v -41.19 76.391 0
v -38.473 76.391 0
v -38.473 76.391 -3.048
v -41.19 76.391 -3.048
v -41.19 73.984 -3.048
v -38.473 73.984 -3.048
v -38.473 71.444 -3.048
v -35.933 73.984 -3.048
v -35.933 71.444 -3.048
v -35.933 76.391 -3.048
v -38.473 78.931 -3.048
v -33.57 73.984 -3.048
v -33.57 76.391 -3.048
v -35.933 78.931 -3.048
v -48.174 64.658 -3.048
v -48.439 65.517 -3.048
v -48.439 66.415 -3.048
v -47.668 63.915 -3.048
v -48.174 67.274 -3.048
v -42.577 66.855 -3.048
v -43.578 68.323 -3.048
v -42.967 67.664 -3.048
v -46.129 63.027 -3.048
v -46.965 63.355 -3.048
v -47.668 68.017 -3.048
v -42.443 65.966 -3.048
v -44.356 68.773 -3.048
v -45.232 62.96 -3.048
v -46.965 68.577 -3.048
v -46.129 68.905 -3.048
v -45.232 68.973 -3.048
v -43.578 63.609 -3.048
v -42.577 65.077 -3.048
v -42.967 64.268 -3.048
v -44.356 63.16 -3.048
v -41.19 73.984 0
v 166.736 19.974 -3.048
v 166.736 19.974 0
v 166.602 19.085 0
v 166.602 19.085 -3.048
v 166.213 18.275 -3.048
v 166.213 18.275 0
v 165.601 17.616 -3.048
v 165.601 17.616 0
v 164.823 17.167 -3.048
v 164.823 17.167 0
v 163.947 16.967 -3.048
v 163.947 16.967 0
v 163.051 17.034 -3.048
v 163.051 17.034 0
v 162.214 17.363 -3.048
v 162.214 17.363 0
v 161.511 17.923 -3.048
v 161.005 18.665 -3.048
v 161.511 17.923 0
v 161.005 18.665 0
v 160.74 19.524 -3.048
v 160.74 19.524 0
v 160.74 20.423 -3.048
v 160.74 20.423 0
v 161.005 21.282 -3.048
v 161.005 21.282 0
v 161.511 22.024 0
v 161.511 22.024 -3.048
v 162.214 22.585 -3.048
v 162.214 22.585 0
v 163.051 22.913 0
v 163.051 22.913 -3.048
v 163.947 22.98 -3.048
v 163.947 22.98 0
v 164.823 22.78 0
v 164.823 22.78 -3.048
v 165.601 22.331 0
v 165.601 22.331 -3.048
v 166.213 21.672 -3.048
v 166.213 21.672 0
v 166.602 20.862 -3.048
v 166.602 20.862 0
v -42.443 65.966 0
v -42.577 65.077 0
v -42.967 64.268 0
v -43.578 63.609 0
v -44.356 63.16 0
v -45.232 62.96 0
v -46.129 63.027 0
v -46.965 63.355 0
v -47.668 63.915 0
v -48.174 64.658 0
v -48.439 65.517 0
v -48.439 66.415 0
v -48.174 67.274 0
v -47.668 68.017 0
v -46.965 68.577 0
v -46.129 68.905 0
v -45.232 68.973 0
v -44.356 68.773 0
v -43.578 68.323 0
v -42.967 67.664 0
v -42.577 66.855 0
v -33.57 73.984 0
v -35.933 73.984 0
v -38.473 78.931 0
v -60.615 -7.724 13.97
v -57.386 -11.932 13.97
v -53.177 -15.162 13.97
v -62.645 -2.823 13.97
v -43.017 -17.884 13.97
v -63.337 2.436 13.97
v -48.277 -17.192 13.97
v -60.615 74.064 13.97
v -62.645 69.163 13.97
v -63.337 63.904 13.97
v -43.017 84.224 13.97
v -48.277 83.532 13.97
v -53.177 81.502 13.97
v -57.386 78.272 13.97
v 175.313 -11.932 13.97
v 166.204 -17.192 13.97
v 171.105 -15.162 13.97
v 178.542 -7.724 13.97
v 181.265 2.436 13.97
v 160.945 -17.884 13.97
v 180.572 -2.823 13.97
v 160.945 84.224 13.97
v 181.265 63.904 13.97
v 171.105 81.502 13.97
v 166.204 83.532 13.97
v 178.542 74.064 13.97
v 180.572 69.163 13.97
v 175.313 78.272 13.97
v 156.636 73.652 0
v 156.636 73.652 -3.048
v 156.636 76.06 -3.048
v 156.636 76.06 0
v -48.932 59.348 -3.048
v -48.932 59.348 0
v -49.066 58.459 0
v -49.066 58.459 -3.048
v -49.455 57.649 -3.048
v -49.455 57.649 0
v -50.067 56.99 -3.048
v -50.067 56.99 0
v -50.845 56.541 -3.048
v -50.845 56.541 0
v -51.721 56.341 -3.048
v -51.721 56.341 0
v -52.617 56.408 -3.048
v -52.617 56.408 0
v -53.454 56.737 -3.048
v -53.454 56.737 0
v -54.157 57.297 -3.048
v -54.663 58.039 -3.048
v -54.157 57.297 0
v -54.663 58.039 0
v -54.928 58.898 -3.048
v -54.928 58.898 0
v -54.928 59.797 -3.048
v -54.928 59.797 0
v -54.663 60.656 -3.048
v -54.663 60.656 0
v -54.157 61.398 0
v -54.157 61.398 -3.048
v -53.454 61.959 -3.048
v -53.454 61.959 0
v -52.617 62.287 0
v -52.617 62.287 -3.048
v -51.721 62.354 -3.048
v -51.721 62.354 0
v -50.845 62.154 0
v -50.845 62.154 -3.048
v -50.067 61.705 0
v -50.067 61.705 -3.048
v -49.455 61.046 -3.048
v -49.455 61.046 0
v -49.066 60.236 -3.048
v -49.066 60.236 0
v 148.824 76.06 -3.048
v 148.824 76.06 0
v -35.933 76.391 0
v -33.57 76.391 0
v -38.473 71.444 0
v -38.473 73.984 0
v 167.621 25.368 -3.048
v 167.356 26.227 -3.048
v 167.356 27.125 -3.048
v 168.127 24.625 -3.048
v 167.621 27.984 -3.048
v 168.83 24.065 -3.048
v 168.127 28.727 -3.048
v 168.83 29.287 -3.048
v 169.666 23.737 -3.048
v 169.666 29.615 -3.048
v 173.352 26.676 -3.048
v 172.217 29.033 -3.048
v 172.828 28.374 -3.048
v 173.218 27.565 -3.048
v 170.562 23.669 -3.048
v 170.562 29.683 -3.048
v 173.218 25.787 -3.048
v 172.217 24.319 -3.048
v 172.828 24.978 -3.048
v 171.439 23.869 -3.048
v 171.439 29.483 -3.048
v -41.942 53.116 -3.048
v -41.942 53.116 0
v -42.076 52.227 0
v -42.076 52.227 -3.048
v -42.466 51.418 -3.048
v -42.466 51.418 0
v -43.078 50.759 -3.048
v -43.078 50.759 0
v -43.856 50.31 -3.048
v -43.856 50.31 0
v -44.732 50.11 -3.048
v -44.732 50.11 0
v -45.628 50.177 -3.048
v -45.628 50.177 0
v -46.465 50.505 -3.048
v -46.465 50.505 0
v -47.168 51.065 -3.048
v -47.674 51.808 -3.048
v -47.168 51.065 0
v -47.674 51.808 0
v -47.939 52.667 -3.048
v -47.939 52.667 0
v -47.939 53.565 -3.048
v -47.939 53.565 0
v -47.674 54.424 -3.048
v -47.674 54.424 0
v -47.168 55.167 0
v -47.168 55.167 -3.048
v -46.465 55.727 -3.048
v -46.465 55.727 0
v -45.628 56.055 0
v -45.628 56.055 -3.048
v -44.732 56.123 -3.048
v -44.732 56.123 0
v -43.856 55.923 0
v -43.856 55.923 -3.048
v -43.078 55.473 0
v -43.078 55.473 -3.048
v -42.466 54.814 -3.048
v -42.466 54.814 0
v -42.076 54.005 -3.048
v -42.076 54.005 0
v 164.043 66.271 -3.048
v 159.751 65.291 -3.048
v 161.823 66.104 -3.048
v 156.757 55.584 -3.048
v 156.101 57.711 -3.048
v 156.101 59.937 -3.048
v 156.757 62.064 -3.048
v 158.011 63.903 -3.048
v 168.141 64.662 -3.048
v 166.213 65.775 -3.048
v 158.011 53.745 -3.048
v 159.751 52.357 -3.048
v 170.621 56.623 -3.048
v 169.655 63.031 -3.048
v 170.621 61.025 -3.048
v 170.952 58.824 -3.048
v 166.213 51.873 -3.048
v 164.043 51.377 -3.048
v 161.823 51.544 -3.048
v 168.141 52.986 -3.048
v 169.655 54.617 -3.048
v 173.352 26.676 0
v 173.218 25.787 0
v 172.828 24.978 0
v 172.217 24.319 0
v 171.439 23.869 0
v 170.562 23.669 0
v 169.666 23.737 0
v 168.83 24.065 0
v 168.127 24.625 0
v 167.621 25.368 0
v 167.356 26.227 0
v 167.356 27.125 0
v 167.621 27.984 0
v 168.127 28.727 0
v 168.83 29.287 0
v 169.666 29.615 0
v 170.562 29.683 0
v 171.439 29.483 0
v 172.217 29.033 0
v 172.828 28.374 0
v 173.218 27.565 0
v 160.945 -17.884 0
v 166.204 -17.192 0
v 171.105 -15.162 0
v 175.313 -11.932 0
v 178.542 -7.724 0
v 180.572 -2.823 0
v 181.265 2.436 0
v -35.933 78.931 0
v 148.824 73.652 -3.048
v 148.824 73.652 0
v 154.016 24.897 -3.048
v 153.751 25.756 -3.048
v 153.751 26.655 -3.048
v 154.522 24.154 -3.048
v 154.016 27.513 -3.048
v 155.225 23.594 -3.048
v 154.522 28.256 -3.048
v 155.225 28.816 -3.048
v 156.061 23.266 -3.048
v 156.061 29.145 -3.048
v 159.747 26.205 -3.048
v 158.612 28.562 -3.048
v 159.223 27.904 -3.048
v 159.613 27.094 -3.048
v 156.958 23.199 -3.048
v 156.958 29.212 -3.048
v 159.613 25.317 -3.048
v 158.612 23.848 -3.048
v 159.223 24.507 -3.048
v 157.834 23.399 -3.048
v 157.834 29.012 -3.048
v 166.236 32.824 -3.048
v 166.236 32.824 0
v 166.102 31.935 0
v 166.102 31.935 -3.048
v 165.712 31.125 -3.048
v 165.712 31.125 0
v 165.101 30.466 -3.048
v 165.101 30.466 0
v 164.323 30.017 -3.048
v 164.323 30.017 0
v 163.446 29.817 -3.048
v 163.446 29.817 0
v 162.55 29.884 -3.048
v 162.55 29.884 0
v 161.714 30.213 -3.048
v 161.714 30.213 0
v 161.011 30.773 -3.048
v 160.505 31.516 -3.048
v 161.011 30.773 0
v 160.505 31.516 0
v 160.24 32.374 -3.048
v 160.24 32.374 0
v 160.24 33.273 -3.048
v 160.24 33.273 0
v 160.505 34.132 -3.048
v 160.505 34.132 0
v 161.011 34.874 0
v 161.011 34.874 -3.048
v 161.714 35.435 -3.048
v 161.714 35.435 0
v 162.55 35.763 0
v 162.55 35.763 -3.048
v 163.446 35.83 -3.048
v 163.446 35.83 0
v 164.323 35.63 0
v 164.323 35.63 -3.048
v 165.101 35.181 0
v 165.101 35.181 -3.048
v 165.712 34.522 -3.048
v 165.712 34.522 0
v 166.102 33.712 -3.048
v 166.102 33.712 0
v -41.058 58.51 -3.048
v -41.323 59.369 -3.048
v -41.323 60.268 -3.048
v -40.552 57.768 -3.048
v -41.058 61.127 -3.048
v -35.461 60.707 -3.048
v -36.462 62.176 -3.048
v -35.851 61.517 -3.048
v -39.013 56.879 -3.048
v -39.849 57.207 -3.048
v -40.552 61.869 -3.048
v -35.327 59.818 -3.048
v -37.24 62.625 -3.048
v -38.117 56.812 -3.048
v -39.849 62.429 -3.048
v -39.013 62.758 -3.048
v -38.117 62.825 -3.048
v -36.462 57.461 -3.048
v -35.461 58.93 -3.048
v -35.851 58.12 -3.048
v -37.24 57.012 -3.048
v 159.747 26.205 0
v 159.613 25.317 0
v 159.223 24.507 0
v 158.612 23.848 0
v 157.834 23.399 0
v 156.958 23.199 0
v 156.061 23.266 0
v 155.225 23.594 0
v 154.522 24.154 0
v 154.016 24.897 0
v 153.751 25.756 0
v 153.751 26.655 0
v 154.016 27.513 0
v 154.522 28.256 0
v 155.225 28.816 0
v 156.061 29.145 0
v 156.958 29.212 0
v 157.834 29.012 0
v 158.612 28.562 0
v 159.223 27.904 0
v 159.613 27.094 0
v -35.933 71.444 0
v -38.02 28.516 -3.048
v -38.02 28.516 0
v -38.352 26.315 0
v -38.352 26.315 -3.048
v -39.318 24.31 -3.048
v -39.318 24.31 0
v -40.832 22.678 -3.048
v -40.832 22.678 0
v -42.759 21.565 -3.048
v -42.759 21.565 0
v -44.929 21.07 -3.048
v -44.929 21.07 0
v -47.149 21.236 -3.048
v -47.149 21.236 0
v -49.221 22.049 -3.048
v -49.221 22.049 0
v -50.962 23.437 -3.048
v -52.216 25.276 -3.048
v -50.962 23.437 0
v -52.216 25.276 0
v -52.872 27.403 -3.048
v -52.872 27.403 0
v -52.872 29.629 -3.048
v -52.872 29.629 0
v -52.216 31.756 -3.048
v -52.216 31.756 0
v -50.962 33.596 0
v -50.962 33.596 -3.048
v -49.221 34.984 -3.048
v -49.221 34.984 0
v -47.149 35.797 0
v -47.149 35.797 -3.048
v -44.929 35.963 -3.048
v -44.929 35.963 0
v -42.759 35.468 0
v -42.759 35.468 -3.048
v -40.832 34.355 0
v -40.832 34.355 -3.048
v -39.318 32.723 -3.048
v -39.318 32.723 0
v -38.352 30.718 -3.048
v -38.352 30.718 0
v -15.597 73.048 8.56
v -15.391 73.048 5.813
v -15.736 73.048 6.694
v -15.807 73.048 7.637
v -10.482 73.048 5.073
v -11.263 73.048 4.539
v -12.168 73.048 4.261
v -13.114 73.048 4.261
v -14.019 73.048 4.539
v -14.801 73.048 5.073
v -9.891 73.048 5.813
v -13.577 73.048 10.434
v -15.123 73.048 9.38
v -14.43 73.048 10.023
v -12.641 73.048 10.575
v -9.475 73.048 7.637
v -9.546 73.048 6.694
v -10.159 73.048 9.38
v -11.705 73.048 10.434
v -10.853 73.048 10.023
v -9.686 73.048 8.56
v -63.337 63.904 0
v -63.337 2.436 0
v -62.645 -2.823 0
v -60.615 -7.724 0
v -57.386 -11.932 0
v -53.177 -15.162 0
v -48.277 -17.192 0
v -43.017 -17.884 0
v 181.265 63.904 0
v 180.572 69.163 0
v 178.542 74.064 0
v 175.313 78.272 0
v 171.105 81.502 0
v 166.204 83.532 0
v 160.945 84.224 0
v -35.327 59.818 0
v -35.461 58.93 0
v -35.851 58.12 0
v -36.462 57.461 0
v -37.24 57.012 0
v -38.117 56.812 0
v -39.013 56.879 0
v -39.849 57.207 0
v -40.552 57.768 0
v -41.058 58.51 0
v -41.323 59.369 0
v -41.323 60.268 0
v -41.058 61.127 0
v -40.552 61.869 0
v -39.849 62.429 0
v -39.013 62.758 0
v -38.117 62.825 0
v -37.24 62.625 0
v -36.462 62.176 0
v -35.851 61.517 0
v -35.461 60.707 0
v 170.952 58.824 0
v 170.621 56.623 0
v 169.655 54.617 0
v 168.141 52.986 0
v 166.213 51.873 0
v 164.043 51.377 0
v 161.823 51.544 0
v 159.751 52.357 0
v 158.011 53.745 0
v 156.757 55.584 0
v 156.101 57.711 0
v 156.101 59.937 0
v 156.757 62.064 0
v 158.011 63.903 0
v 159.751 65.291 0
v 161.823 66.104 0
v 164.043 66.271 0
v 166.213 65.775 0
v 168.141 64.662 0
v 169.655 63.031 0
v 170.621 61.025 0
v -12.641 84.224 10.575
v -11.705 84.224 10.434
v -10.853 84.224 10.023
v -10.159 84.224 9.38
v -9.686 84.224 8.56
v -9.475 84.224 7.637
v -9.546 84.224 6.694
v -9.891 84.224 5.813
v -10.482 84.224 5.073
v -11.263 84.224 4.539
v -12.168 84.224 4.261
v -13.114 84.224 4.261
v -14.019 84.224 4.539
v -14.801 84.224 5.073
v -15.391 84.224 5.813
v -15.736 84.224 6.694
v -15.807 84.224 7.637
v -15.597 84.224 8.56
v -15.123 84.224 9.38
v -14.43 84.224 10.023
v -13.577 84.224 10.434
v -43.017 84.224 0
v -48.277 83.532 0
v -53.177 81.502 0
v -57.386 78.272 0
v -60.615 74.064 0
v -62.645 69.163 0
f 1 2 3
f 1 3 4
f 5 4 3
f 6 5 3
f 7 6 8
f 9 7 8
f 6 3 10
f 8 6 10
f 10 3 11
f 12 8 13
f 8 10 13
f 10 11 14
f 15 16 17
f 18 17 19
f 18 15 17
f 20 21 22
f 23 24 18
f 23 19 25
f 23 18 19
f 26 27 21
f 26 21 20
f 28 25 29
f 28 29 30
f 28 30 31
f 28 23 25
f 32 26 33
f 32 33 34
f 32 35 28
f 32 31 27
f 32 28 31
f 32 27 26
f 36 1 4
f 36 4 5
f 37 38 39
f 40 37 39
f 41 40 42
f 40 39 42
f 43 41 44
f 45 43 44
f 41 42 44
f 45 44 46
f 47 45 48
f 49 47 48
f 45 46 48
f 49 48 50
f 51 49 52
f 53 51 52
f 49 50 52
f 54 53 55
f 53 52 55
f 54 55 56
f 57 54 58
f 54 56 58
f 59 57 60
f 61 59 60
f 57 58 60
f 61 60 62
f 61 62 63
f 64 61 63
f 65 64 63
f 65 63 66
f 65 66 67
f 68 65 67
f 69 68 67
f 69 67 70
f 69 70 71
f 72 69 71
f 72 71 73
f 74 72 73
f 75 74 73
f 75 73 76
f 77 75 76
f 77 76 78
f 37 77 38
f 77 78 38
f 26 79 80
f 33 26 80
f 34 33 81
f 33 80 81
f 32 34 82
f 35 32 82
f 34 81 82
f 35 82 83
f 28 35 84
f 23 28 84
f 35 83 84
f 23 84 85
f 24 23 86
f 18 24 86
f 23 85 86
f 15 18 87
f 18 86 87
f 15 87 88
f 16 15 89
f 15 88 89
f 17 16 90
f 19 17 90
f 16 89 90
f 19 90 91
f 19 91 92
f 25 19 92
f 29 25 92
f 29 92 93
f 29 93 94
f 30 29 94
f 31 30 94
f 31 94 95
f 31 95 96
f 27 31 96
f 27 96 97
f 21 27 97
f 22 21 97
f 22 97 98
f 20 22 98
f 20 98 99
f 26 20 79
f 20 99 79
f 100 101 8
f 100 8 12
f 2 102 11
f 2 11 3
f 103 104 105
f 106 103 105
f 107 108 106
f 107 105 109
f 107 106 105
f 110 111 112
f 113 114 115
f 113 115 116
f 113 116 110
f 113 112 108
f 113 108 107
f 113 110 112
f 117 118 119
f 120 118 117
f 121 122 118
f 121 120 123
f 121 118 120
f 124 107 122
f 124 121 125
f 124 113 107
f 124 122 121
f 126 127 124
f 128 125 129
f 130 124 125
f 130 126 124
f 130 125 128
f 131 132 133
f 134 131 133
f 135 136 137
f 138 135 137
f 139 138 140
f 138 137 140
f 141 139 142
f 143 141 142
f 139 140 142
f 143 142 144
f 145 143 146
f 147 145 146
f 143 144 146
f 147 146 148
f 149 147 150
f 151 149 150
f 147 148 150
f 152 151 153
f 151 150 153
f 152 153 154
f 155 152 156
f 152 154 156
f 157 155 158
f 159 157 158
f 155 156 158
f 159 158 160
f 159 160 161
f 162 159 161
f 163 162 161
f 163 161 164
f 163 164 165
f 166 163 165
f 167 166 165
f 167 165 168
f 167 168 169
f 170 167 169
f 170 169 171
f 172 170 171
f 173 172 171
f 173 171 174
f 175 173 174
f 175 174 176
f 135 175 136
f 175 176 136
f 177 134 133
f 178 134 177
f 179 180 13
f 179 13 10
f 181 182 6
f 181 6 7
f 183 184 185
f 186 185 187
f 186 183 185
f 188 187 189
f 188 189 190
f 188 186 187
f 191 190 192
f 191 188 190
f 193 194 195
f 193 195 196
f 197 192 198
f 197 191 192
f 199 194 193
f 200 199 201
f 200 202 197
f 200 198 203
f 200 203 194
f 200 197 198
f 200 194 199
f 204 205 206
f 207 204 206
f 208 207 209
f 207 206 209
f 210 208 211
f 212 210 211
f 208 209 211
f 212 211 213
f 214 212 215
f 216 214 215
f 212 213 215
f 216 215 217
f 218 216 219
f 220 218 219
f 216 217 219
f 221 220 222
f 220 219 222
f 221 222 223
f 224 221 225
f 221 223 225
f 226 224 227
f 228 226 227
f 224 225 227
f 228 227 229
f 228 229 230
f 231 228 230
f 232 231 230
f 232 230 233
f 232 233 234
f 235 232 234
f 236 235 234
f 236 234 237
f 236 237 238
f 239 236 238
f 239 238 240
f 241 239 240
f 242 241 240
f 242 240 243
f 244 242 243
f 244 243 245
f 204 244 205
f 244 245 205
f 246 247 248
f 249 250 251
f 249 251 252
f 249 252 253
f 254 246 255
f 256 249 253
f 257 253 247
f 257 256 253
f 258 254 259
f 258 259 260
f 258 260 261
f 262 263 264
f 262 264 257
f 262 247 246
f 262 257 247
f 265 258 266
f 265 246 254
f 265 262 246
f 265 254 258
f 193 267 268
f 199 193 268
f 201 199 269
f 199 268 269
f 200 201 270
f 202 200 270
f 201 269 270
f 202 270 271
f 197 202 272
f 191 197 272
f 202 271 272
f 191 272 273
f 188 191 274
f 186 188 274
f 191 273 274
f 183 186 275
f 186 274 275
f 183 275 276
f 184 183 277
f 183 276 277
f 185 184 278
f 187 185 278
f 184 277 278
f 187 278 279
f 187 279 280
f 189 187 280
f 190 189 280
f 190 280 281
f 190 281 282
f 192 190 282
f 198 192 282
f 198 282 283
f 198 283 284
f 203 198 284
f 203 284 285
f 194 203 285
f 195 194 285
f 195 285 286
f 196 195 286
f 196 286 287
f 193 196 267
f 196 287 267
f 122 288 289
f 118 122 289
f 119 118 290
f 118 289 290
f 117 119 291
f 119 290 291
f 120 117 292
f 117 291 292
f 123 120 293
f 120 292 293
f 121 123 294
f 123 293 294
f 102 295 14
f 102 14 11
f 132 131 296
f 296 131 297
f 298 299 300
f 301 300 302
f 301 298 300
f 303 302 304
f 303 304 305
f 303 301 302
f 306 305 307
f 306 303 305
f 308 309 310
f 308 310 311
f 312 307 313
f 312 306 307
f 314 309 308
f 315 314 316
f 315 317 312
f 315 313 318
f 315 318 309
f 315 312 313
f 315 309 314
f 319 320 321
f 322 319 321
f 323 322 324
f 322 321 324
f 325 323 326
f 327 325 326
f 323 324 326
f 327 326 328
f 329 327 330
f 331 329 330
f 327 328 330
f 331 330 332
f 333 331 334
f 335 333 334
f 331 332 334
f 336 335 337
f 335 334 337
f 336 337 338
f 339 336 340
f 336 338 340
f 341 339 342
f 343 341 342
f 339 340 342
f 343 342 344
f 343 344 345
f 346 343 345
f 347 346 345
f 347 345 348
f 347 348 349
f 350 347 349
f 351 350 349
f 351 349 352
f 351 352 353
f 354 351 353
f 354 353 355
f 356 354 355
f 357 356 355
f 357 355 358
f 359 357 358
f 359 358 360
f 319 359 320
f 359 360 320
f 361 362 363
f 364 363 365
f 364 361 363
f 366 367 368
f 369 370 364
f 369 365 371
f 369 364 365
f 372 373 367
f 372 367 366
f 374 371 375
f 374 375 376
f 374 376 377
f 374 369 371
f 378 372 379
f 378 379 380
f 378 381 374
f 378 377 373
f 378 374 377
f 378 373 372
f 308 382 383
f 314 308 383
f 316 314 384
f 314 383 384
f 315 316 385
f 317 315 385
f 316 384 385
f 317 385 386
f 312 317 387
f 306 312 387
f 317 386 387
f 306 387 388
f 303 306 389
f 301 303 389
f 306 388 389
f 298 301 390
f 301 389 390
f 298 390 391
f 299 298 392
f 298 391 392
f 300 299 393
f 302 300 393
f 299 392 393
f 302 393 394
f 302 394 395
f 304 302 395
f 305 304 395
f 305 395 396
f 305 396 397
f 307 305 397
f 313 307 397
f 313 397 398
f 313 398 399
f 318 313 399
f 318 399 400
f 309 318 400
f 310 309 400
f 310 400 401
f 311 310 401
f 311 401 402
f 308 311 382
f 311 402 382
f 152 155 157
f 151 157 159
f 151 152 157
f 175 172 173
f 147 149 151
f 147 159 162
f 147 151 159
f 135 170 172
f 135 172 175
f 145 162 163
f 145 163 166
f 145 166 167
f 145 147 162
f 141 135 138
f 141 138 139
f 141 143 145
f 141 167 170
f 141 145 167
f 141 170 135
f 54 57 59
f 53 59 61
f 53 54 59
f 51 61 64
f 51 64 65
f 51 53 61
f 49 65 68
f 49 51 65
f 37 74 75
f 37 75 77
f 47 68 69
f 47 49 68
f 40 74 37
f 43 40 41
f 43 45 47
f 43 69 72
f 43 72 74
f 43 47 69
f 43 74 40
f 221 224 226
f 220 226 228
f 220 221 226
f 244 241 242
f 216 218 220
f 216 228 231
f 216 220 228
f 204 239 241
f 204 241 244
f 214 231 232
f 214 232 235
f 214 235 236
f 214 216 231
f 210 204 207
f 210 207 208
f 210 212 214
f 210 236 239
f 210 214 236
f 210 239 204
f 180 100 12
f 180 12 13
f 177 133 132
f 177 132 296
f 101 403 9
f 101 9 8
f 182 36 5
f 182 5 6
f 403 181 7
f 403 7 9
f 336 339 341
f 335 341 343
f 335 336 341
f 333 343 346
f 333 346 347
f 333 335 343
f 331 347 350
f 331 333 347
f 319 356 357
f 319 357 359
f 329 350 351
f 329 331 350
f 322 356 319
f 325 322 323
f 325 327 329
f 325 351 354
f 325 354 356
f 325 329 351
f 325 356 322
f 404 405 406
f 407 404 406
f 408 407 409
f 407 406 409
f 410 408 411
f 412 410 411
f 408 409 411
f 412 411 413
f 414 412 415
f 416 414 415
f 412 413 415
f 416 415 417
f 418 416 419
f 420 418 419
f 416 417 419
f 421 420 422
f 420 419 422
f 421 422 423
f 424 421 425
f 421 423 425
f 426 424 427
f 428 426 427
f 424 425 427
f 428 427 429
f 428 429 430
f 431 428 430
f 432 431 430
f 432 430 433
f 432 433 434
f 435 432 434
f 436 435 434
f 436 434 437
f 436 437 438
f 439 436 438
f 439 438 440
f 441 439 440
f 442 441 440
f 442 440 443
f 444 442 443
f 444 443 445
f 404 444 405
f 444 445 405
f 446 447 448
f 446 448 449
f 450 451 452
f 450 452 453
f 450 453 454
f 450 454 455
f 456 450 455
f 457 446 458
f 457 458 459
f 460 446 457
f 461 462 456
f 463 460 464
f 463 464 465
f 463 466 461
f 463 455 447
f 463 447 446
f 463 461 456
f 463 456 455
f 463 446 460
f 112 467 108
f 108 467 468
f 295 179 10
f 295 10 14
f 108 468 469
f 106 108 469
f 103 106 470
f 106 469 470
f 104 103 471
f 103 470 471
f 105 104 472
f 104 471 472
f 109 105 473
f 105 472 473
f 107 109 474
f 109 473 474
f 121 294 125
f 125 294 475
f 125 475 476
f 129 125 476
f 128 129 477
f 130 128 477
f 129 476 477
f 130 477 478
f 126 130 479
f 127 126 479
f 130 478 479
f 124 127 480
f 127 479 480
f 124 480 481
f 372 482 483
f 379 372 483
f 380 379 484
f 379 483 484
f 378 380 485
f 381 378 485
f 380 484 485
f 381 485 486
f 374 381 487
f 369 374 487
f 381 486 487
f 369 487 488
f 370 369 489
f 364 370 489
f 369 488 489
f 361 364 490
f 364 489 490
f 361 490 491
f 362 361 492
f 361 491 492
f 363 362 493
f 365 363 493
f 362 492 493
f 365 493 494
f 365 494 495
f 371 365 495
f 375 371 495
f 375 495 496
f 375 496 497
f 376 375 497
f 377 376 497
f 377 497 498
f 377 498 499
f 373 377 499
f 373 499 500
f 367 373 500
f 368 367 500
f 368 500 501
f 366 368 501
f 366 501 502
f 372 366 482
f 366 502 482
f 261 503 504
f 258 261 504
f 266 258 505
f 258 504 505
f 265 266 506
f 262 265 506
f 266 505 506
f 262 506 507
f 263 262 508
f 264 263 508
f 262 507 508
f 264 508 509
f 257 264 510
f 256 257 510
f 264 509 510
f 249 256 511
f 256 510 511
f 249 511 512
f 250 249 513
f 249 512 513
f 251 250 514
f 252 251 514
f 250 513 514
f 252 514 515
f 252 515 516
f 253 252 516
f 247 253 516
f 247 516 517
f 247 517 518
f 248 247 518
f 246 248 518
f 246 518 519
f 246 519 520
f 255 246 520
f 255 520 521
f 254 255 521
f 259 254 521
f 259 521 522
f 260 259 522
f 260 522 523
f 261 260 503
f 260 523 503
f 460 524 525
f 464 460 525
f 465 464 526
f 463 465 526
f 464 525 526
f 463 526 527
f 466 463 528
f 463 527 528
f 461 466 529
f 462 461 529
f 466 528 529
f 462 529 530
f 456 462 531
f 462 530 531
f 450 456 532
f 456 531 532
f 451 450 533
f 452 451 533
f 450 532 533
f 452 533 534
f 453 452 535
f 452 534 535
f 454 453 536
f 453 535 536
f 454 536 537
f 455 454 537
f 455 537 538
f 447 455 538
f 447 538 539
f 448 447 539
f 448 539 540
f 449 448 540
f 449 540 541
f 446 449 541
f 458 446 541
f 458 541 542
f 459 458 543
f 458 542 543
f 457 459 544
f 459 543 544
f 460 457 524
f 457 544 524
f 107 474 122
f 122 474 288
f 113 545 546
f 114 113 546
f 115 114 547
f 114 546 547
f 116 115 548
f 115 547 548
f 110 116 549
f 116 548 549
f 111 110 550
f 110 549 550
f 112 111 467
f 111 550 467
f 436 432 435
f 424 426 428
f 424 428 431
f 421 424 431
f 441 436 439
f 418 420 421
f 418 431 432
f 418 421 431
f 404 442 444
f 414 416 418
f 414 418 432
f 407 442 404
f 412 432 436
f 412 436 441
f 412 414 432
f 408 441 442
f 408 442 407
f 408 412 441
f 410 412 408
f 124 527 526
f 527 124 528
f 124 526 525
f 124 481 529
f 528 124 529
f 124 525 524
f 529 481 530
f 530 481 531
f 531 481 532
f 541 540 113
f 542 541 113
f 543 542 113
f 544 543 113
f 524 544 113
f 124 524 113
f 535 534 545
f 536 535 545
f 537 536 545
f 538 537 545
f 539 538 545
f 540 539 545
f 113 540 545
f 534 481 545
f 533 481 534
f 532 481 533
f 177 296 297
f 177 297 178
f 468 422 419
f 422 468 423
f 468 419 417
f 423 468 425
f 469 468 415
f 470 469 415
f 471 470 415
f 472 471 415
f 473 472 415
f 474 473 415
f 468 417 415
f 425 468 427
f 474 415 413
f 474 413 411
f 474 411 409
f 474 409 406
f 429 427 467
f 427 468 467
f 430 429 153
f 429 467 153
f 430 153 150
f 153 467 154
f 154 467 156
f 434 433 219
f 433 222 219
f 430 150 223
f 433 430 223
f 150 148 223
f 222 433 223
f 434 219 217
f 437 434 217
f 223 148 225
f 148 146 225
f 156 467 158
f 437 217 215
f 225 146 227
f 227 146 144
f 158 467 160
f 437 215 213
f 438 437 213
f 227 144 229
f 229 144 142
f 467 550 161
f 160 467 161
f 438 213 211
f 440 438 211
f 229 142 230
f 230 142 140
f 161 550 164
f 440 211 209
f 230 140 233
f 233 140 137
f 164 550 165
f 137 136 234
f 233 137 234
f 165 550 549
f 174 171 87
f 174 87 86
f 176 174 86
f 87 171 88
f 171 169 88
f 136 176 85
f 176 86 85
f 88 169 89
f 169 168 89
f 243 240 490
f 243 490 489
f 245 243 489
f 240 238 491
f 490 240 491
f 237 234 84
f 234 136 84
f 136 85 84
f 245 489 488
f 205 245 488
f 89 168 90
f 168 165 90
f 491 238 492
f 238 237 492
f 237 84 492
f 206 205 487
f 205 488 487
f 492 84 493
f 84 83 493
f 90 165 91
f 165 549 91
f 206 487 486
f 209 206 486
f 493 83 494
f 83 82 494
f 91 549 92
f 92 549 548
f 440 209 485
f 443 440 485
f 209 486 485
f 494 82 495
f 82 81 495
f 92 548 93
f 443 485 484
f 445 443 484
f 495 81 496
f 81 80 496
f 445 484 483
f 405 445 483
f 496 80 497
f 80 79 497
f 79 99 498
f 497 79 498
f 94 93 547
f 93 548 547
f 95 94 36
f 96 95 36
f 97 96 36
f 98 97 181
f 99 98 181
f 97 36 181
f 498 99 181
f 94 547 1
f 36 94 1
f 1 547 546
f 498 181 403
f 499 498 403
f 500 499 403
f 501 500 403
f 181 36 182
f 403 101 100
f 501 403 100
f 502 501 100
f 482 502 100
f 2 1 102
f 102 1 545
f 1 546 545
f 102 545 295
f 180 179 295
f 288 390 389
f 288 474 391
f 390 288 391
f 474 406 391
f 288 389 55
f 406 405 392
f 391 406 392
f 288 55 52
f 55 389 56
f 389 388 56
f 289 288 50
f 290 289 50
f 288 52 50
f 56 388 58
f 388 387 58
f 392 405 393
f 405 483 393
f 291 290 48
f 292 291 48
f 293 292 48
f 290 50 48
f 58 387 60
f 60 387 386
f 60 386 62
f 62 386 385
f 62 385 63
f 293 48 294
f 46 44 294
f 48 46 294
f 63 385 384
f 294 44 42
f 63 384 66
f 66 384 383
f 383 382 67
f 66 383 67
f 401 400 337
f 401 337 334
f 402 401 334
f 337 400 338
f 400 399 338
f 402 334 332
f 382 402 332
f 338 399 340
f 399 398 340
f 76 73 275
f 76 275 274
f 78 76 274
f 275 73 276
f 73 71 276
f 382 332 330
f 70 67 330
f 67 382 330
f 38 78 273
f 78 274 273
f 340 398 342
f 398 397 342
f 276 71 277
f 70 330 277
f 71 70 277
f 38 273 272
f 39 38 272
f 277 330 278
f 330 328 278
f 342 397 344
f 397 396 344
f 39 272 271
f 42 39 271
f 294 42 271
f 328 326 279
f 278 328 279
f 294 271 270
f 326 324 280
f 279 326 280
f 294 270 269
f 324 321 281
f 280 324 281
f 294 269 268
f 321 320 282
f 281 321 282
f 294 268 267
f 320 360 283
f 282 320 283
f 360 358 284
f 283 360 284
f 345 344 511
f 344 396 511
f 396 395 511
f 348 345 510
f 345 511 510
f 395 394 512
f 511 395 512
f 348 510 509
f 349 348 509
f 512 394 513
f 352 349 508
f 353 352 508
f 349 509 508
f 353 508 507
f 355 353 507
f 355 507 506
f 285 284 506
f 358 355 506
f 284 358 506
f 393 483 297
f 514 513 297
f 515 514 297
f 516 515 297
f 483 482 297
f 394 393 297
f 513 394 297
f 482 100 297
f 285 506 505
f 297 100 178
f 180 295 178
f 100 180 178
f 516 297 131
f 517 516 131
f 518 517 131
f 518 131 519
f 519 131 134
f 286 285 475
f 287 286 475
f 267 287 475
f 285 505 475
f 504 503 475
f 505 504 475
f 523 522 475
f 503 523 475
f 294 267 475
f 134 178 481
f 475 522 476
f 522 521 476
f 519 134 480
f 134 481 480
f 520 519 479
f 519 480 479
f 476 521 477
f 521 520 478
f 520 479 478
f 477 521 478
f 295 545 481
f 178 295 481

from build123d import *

# Parameters (mm, degrees)
SKETCH1_W           = 172.974
SKETCH1_H           = 102.108
BOSS_EXTRUDE1_DEPTH = 13.97
SKETCH2_R           = 7.4676
SKETCH2_R_2         = 3.014975044
SKETCH2_W           = 7.81218406
SKETCH2_H           = 2.407827673
BOSS_EXTRUDE3_DEPTH = 3.048
SKETCH3_R           = 7.4676
SKETCH3_R_2         = 3.014975044
BOSS_EXTRUDE5_DEPTH = 3.048
SKETCH4_R           = 3.175
CUT_EXTRUDE1_DEPTH  = 11.176


with BuildPart() as part:
    # Sketch1 → Boss-Extrude1 (new body)
    with BuildSketch(Plane.XY):
        with Locations((58.9637029, 33.169946412)):
            Rectangle(SKETCH1_W, SKETCH1_H)
        with BuildLine():
            Line((-27.5232971, 84.223946412), (-43.0172971, 84.223946412))
            ThreePointArc((-43.0172971, 84.223946412), (-57.385706894, 78.272356205), (-63.3372971, 63.903946412))
            Line((-63.3372971, 63.903946412), (-63.3372971, 2.435946412))
            ThreePointArc((-63.3372971, 2.435946412), (-57.385706894, -11.932463382), (-43.0172971, -17.884053588))
            Line((-43.0172971, -17.884053588), (-27.5232971, -17.884053588))
            Line((-27.5232971, -17.884053588), (-27.5232971, 84.223946412))
        make_face()
        with BuildLine():
            Line((160.9447029, 84.223946412), (145.4507029, 84.223946412))
            Line((145.4507029, 84.223946412), (145.4507029, -17.884053588))
            Line((145.4507029, -17.884053588), (160.9447029, -17.884053588))
            ThreePointArc((160.9447029, -17.884053588), (175.313112694, -11.932463382), (181.2647029, 2.435946412))
            Line((181.2647029, 2.435946412), (181.2647029, 63.903946412))
            ThreePointArc((181.2647029, 63.903946412), (175.313112694, 78.272356205), (160.9447029, 84.223946412))
        make_face()
    extrude(amount=BOSS_EXTRUDE1_DEPTH)

    # Sketch2 → Boss-Extrude3 (add)
    with BuildSketch(Plane(origin=(0, 0, 0), x_dir=(-1, 0, 0), z_dir=(0, 0, -1))):
        with Locations(Location((-163.4847029, 58.823946412, 0), (0, 0, 180))):
            Circle(SKETCH2_R)
        with Locations(Location((-170.337090886, 26.676001086, 0), (0, 0, 180))):
            Circle(SKETCH2_R_2)
        with Locations(Location((-163.221177768, 32.823656386, 0), (0, 0, 180))):
            Circle(SKETCH2_R_2)
        with Locations(Location((-156.732358191, 26.205188985, 0), (0, 0, 180))):
            Circle(SKETCH2_R_2)
        with Locations(Location((-163.721455714, 19.973644896, 0), (0, 0, 180))):
            Circle(SKETCH2_R_2)
        with Locations((-152.730393721, 74.856056835)):
            Rectangle(SKETCH2_W, SKETCH2_H)
    extrude(amount=BOSS_EXTRUDE3_DEPTH)

    # Sketch3 → Boss-Extrude5 (add)
    with BuildSketch(Plane(origin=(0, 0, 0), x_dir=(-1, 0, 0), z_dir=(0, 0, -1))):
        with Locations(Location((45.487523866, 28.516423037, 0), (0, 0, 180))):
            Circle(SKETCH3_R)
        with Locations(Location((44.957454366, 53.116068624, 0), (0, 0, 180))):
            Circle(SKETCH3_R_2)
        with Locations(Location((38.341819194, 59.818424813, 0), (0, 0, 180))):
            Circle(SKETCH3_R_2)
        with Locations(Location((45.457732312, 65.966080113, 0), (0, 0, 180))):
            Circle(SKETCH3_R_2)
        with Locations(Location((51.94655189, 59.347612713, 0), (0, 0, 180))):
            Circle(SKETCH3_R_2)
        Polygon((38.47340824, 76.391412748), (41.190295926, 76.391412748), (41.190295926, 73.983585075), (38.47340824, 73.983585075), (38.47340824, 71.443585075), (35.93340824, 71.443585075), (35.93340824, 73.983585075), (33.570295926, 73.983585075), (33.570295926, 76.391412748), (35.93340824, 76.391412748), (35.93340824, 78.931412748), (38.47340824, 78.931412748), align=None)
    extrude(amount=BOSS_EXTRUDE5_DEPTH)

    # Sketch4 → Cut-Extrude1 (cut)
    with BuildSketch(Plane(origin=(0, 84.223946412, 0), x_dir=(1, 0, 0), z_dir=(0, 1, 0))):
        with Locations(Location((-12.641077469, -7.400069152, 0), (0, 0, 270))):
            Circle(SKETCH4_R)
    extrude(amount=-CUT_EXTRUDE1_DEPTH, mode=Mode.SUBTRACT)


solid = part.part
